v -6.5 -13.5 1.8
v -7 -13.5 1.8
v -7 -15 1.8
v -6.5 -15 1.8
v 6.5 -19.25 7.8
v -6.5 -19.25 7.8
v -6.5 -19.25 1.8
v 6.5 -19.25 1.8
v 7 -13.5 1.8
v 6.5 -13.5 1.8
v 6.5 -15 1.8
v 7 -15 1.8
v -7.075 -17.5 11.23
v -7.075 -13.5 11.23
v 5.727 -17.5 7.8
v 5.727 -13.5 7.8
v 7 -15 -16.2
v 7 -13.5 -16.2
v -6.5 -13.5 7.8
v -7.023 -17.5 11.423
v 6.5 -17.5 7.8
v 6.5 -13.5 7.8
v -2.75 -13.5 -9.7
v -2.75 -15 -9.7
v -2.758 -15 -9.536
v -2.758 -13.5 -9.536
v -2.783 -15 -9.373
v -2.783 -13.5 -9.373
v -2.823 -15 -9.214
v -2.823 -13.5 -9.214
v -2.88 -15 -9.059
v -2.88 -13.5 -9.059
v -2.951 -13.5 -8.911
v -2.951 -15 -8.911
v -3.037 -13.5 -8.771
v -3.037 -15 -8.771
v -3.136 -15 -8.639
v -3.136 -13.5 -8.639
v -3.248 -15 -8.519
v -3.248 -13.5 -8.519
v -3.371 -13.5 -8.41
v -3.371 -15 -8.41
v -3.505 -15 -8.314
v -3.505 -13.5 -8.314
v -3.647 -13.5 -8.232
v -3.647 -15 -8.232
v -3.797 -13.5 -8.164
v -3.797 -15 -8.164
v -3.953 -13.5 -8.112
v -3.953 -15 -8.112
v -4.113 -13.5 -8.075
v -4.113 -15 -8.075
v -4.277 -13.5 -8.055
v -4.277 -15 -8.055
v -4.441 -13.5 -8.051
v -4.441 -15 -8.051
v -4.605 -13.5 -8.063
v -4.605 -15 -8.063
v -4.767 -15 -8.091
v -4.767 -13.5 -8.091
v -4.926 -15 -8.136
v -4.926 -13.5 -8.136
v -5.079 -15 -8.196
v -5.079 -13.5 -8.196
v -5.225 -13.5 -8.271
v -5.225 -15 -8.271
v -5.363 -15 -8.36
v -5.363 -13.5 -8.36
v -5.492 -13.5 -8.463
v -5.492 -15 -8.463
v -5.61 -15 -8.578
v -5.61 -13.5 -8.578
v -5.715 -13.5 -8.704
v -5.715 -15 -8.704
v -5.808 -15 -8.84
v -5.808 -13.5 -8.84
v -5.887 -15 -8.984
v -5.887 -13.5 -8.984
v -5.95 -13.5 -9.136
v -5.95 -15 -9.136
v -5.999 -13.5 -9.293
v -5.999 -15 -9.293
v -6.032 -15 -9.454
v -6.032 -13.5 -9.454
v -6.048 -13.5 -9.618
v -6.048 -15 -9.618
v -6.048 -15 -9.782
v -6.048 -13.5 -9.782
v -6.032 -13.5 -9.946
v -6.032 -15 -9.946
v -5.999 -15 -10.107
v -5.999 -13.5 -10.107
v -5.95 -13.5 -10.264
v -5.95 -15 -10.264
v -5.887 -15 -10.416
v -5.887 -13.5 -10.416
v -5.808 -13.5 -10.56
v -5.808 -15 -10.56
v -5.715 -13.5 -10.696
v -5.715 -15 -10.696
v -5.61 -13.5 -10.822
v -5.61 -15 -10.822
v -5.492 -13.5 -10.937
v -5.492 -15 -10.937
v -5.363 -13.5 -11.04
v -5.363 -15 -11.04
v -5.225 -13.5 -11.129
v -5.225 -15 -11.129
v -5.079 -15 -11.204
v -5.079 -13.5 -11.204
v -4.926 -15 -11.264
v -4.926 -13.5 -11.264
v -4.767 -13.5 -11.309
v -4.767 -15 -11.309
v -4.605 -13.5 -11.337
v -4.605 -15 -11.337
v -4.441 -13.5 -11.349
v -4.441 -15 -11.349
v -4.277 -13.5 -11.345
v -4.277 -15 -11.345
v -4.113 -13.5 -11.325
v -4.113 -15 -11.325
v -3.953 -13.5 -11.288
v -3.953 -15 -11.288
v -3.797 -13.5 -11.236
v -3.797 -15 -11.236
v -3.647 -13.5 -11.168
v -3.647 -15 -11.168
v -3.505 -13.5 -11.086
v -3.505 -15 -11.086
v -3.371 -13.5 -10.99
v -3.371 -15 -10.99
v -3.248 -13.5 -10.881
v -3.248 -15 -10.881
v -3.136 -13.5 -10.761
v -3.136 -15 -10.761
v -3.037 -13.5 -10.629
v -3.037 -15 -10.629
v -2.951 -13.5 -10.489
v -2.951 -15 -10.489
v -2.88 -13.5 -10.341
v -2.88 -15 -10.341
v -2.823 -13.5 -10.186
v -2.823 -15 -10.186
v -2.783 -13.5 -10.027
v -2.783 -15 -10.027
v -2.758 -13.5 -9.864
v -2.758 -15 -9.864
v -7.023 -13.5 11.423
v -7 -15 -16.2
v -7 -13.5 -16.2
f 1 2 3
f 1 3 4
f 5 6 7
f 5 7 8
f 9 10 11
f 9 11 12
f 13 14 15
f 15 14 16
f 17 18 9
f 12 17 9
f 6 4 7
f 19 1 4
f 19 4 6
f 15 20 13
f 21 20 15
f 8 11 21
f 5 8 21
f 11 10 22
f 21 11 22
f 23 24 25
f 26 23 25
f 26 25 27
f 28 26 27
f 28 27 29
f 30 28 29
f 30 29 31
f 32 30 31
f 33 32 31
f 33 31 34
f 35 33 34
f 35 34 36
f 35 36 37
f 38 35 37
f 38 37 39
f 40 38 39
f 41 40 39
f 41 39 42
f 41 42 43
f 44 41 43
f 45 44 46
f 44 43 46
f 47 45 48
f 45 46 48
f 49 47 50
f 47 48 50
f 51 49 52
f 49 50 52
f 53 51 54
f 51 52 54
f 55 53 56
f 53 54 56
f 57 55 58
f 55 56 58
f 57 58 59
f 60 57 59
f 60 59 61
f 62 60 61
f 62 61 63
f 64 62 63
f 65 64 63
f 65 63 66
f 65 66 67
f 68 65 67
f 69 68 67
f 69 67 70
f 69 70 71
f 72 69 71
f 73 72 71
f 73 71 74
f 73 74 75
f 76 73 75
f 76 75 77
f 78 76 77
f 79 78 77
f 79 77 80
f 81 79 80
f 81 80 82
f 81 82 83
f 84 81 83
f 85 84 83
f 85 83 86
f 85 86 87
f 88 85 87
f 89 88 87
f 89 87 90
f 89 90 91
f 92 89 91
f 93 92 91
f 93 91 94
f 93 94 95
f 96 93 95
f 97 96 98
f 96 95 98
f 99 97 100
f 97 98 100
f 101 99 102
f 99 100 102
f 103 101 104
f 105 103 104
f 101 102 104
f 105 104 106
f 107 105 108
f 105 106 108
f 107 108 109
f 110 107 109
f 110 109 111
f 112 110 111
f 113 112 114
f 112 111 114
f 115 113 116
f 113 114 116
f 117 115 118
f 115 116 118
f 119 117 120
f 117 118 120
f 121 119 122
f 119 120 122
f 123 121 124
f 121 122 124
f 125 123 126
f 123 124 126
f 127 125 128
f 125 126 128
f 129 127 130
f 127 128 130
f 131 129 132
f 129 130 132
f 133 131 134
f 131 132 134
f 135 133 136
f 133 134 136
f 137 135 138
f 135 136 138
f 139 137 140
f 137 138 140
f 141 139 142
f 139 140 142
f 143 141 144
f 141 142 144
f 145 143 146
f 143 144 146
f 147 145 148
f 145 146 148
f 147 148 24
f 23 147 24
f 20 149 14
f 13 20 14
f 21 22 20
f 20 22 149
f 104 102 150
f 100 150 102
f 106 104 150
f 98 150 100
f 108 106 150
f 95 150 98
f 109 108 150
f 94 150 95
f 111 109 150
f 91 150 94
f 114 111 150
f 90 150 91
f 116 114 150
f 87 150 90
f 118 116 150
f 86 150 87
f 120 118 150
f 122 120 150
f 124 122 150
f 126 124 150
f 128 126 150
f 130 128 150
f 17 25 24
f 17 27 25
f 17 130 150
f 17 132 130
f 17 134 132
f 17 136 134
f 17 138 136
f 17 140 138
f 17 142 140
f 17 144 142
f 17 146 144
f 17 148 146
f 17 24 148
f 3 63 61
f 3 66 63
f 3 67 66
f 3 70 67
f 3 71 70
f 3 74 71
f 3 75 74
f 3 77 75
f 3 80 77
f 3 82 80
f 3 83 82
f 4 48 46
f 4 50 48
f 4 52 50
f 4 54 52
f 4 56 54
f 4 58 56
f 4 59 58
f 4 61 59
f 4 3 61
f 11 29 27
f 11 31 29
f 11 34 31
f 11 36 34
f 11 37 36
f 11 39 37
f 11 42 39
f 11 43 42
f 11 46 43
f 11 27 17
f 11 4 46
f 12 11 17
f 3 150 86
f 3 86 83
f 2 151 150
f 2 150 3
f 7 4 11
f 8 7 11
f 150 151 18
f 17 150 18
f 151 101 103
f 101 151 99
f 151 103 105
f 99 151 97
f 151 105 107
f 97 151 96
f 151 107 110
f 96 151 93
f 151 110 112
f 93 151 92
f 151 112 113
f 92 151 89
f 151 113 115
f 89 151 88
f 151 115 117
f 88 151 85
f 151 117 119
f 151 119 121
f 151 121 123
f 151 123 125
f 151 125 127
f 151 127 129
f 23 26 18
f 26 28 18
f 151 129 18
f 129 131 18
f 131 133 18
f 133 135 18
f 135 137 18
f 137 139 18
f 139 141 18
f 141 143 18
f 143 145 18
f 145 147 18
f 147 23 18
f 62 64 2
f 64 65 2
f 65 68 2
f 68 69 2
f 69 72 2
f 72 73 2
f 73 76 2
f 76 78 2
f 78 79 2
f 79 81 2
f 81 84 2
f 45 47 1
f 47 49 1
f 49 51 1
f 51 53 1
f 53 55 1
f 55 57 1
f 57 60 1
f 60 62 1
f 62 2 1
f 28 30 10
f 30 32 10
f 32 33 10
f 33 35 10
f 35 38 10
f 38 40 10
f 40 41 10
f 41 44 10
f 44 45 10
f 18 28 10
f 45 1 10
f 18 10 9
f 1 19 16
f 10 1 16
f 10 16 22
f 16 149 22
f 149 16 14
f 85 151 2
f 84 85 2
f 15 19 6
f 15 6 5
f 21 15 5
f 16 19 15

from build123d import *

# Parameters (mm, degrees)
F0_W     = 14
F0_H     = 18
F1_DEPTH = 1.5
F2_W     = 13
F2_H     = 6
F3_DEPTH = 5.75
F4_R     = 1.65
F5_DEPTH = 25
F7_DEPTH = 4
F8_ANGLE = -90


with BuildPart() as f1:
    # F0 (on Top) → F1 (new body)
    with BuildSketch(Plane.XY):
        Rectangle(F0_W, F0_H)
    extrude(amount=F1_DEPTH)

    # F2 (on Top) → F3 (join)
    with BuildSketch(Plane.XY):
        with Locations((0, 12)):
            Rectangle(F2_W, F2_H)
    extrude(amount=F3_DEPTH)

    # F4 (on face) → F5 (cut)
    with BuildSketch(Plane.XY.offset(1.5)):
        with Locations((-4.4, -2.5)):
            Circle(F4_R)
    extrude(amount=-F5_DEPTH, mode=Mode.SUBTRACT)

    # F6 (on Top) → F7 (join)
    with BuildSketch(Plane.XY):
        Polygon((5.727259339, 15), (6.5, 15), (-7.022961568, 18.6234666314), (-7.0747253771, 18.4302814662), align=None)
    extrude(amount=F7_DEPTH)


with BuildPart() as f1_1:
    # F8: moved
    add(f1.part.rotate(Axis((0, -9, 1.5), (-1, 0, 0)), F8_ANGLE))


with BuildPart() as f1_2:
    # F9: moved
    add(f1_1.part.moved(Location((0, -6, -17.7))))


solid = f1_2.part
